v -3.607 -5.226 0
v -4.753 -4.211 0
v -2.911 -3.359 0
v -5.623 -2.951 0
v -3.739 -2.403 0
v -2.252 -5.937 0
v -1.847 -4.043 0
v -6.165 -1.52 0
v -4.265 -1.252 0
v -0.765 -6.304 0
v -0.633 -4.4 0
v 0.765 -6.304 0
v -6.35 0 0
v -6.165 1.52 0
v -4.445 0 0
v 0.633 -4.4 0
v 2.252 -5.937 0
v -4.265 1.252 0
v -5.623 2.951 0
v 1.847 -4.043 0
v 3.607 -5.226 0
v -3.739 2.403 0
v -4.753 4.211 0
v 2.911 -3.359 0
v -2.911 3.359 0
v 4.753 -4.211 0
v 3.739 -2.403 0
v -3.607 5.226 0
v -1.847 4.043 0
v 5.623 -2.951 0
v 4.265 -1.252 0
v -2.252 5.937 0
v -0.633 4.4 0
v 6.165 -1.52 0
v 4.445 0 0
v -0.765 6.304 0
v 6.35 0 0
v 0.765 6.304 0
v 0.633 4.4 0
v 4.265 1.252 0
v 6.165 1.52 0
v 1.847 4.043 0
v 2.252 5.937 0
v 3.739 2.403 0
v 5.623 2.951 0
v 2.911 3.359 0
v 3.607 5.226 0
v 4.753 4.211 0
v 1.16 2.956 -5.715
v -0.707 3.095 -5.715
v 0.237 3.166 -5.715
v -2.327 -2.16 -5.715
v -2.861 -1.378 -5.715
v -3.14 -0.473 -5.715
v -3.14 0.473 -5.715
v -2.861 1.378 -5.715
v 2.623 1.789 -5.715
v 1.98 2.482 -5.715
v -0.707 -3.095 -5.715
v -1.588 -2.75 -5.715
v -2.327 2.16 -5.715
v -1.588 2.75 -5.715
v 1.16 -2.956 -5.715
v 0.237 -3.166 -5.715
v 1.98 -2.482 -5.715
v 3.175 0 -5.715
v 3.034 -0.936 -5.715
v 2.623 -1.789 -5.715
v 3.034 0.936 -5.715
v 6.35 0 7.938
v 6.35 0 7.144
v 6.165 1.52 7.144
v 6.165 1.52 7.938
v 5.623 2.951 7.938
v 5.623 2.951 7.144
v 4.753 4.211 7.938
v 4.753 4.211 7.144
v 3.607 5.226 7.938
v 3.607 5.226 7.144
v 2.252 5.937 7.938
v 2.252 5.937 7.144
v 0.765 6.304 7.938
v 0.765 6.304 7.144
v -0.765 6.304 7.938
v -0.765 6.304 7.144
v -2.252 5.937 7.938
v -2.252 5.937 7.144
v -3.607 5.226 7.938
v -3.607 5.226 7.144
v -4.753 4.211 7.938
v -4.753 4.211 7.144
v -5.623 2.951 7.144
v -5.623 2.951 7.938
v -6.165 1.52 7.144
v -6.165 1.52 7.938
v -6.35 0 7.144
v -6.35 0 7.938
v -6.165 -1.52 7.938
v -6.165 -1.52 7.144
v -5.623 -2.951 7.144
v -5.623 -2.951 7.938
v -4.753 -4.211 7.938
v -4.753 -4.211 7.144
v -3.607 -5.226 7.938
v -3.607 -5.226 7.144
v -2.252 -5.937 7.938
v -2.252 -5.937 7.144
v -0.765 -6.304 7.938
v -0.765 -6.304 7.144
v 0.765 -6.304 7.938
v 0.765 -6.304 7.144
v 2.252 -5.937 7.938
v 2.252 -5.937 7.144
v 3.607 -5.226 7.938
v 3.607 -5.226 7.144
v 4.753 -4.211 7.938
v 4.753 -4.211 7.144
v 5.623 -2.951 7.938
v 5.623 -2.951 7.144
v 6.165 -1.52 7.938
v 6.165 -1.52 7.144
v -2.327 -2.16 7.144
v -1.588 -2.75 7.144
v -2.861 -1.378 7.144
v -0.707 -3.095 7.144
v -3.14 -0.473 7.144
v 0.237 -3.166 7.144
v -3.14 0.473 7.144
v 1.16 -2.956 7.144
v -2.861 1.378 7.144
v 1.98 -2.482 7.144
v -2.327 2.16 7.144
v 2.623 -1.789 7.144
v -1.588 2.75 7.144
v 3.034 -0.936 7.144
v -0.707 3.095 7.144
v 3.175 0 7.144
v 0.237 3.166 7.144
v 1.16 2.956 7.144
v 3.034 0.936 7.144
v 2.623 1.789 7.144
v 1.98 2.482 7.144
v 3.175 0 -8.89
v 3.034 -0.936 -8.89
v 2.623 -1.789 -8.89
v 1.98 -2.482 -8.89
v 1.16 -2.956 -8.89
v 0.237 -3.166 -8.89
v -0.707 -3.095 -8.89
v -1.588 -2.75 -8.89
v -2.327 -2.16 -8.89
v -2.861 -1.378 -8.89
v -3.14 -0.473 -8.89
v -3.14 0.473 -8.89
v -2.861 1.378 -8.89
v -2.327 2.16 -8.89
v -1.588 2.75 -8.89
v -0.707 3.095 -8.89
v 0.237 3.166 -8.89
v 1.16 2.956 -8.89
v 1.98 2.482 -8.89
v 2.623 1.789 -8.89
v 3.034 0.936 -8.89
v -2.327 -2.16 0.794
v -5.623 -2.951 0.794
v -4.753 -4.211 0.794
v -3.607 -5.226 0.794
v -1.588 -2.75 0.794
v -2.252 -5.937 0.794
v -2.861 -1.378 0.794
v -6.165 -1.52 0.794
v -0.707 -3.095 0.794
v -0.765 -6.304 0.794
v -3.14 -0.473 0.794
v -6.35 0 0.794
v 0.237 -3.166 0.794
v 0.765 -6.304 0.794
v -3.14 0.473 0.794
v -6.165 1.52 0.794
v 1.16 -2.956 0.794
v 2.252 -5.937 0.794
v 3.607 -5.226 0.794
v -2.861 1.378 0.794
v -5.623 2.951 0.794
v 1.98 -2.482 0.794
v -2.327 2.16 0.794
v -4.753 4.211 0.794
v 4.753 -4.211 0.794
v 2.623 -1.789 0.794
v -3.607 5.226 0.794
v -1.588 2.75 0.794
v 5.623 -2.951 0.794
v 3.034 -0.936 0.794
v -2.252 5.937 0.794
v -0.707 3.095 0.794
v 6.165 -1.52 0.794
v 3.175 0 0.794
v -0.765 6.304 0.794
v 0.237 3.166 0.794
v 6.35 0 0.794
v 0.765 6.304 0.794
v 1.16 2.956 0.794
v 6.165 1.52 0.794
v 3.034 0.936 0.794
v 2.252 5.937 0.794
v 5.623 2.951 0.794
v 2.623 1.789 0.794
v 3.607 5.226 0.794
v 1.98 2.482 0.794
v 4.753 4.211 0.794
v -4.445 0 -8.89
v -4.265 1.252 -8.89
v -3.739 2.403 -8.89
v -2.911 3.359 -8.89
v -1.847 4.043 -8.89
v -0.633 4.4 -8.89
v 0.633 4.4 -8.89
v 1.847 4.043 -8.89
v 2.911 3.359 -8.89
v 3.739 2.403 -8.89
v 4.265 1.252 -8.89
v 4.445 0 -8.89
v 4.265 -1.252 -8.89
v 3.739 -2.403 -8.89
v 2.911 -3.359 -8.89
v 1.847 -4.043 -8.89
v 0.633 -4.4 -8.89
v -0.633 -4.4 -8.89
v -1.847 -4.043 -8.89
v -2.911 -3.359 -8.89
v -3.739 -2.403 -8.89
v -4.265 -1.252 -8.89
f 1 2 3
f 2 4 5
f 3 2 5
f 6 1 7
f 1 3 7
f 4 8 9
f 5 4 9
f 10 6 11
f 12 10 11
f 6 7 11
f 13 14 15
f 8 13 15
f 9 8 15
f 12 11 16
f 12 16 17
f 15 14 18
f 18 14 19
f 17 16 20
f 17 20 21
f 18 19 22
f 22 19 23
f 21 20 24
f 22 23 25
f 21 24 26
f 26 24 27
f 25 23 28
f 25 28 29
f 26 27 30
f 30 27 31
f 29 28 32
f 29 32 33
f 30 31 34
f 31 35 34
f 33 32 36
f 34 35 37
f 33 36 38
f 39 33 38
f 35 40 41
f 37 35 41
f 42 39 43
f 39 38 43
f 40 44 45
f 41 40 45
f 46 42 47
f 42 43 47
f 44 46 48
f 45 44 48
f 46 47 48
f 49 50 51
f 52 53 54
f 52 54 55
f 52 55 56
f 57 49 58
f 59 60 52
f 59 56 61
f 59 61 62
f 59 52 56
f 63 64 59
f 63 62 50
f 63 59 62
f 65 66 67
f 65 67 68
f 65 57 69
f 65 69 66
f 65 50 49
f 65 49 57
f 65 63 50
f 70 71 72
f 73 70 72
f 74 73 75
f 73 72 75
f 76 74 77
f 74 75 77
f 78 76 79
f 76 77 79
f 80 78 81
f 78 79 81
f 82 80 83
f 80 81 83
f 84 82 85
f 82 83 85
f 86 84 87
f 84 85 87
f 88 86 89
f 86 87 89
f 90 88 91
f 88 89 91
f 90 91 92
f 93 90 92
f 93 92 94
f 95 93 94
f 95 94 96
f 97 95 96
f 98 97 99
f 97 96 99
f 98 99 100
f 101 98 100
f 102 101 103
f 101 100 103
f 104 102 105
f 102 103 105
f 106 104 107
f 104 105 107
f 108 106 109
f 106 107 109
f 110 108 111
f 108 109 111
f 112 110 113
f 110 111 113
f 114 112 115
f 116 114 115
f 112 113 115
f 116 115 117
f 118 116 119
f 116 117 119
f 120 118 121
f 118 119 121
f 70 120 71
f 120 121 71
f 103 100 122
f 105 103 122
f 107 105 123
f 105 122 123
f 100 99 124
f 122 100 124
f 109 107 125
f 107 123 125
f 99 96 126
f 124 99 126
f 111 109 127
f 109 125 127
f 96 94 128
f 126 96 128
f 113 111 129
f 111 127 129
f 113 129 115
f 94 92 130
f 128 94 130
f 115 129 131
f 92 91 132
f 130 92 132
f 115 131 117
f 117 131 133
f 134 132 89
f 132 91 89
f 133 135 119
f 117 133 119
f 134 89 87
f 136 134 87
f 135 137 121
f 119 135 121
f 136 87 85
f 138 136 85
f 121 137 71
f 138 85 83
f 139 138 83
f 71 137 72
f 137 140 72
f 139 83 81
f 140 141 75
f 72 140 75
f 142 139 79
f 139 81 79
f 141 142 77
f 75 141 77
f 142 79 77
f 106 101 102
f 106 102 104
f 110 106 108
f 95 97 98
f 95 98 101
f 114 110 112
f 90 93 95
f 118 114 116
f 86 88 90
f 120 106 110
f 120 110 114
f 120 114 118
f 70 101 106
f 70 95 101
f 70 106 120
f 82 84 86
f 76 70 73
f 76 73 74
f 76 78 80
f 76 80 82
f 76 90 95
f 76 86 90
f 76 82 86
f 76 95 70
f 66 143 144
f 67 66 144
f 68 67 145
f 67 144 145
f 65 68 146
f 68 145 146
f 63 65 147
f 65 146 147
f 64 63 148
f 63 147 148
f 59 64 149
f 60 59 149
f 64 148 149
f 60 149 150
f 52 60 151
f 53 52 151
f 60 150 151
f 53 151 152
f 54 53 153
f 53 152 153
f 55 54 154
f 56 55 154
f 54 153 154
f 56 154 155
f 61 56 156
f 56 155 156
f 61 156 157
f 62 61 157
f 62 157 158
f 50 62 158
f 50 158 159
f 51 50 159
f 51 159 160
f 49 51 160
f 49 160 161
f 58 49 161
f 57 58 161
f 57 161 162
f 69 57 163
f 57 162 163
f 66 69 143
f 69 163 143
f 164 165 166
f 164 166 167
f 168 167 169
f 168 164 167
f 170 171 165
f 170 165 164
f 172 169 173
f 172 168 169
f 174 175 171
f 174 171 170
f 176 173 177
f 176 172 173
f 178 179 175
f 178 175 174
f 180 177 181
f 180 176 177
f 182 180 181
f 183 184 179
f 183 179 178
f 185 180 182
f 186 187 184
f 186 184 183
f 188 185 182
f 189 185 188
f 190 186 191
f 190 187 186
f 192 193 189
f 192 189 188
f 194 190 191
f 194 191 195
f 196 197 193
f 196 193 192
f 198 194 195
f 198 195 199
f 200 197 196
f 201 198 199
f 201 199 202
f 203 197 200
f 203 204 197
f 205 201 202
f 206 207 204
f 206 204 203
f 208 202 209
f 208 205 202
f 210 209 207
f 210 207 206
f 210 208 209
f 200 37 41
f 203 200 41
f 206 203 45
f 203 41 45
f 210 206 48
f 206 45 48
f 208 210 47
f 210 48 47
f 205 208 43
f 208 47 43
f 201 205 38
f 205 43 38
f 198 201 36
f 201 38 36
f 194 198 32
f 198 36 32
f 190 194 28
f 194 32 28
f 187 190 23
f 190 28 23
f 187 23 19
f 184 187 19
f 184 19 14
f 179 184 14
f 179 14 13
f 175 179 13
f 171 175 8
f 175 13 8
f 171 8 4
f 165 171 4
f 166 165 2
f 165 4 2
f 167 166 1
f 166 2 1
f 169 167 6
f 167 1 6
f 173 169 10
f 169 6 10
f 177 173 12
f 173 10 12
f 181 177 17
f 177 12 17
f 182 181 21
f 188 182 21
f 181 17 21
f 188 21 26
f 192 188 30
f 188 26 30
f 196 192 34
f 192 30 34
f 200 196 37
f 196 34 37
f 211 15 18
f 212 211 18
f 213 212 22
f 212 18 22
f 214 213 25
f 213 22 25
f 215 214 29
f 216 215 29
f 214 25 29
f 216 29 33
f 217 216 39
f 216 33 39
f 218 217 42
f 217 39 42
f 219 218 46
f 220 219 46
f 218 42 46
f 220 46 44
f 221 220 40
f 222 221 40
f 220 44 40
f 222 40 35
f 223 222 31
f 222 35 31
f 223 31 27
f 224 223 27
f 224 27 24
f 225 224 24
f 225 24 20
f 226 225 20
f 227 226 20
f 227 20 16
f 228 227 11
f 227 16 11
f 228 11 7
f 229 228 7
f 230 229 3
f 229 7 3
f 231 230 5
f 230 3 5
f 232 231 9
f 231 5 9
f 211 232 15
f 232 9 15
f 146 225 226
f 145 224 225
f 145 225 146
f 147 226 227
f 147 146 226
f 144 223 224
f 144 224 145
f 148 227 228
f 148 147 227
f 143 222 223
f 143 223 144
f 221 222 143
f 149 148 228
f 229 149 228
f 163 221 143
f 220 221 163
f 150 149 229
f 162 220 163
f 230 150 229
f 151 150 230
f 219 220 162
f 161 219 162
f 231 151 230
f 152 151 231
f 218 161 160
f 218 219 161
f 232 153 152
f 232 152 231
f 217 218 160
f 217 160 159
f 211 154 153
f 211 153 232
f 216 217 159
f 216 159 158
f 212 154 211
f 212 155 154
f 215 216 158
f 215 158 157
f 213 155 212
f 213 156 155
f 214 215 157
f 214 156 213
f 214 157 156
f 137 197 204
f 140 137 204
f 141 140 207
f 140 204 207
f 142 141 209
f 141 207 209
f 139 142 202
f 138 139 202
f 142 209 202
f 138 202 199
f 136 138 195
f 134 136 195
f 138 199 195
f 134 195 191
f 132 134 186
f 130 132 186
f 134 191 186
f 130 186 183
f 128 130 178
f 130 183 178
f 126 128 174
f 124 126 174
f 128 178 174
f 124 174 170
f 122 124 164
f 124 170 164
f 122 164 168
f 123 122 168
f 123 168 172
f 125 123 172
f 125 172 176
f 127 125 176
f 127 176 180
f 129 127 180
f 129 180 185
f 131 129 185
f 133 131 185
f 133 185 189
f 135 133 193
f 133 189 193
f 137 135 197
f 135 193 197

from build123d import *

# Parameters (mm, degrees)
SKETCH1_R           = 6.35
BOSS_EXTRUDE1_DEPTH = 0.79375
SKETCH2_R           = 3.175
BOSS_EXTRUDE2_DEPTH = 6.35
SKETCH3_R           = 6.35
BOSS_EXTRUDE3_DEPTH = 0.79375
SKETCH4_R           = 4.445
BOSS_EXTRUDE4_DEPTH = 8.89
SKETCH5_R           = 3.175
CUT_EXTRUDE1_DEPTH  = 3.175


with BuildPart() as part:
    # Sketch1 → Boss-Extrude1 (new body)
    with BuildSketch(Plane.XY):
        Circle(SKETCH1_R)
    extrude(amount=BOSS_EXTRUDE1_DEPTH)

    # Sketch2 → Boss-Extrude2 (add)
    with BuildSketch(Plane.XY.offset(0.79375)):
        Circle(SKETCH2_R)
    extrude(amount=BOSS_EXTRUDE2_DEPTH)

    # Sketch3 → Boss-Extrude3 (add)
    with BuildSketch(Plane.XY.offset(7.14375)):
        Circle(SKETCH3_R)
    extrude(amount=BOSS_EXTRUDE3_DEPTH)

    # Sketch4 → Boss-Extrude4 (add)
    with BuildSketch(Plane(origin=(0, 0, 0), x_dir=(-1, 0, 0), z_dir=(0, 0, -1))):
        Circle(SKETCH4_R)
    extrude(amount=BOSS_EXTRUDE4_DEPTH)

    # Sketch5 → Cut-Extrude1 (cut)
    with BuildSketch(Plane(origin=(0, 0, -8.89), x_dir=(-1, 0, 0), z_dir=(0, 0, -1))):
        with Locations(Location((0, 0, 0), (0, 0, 180))):
            Circle(SKETCH5_R)
    extrude(amount=-CUT_EXTRUDE1_DEPTH, mode=Mode.SUBTRACT)


solid = part.part
